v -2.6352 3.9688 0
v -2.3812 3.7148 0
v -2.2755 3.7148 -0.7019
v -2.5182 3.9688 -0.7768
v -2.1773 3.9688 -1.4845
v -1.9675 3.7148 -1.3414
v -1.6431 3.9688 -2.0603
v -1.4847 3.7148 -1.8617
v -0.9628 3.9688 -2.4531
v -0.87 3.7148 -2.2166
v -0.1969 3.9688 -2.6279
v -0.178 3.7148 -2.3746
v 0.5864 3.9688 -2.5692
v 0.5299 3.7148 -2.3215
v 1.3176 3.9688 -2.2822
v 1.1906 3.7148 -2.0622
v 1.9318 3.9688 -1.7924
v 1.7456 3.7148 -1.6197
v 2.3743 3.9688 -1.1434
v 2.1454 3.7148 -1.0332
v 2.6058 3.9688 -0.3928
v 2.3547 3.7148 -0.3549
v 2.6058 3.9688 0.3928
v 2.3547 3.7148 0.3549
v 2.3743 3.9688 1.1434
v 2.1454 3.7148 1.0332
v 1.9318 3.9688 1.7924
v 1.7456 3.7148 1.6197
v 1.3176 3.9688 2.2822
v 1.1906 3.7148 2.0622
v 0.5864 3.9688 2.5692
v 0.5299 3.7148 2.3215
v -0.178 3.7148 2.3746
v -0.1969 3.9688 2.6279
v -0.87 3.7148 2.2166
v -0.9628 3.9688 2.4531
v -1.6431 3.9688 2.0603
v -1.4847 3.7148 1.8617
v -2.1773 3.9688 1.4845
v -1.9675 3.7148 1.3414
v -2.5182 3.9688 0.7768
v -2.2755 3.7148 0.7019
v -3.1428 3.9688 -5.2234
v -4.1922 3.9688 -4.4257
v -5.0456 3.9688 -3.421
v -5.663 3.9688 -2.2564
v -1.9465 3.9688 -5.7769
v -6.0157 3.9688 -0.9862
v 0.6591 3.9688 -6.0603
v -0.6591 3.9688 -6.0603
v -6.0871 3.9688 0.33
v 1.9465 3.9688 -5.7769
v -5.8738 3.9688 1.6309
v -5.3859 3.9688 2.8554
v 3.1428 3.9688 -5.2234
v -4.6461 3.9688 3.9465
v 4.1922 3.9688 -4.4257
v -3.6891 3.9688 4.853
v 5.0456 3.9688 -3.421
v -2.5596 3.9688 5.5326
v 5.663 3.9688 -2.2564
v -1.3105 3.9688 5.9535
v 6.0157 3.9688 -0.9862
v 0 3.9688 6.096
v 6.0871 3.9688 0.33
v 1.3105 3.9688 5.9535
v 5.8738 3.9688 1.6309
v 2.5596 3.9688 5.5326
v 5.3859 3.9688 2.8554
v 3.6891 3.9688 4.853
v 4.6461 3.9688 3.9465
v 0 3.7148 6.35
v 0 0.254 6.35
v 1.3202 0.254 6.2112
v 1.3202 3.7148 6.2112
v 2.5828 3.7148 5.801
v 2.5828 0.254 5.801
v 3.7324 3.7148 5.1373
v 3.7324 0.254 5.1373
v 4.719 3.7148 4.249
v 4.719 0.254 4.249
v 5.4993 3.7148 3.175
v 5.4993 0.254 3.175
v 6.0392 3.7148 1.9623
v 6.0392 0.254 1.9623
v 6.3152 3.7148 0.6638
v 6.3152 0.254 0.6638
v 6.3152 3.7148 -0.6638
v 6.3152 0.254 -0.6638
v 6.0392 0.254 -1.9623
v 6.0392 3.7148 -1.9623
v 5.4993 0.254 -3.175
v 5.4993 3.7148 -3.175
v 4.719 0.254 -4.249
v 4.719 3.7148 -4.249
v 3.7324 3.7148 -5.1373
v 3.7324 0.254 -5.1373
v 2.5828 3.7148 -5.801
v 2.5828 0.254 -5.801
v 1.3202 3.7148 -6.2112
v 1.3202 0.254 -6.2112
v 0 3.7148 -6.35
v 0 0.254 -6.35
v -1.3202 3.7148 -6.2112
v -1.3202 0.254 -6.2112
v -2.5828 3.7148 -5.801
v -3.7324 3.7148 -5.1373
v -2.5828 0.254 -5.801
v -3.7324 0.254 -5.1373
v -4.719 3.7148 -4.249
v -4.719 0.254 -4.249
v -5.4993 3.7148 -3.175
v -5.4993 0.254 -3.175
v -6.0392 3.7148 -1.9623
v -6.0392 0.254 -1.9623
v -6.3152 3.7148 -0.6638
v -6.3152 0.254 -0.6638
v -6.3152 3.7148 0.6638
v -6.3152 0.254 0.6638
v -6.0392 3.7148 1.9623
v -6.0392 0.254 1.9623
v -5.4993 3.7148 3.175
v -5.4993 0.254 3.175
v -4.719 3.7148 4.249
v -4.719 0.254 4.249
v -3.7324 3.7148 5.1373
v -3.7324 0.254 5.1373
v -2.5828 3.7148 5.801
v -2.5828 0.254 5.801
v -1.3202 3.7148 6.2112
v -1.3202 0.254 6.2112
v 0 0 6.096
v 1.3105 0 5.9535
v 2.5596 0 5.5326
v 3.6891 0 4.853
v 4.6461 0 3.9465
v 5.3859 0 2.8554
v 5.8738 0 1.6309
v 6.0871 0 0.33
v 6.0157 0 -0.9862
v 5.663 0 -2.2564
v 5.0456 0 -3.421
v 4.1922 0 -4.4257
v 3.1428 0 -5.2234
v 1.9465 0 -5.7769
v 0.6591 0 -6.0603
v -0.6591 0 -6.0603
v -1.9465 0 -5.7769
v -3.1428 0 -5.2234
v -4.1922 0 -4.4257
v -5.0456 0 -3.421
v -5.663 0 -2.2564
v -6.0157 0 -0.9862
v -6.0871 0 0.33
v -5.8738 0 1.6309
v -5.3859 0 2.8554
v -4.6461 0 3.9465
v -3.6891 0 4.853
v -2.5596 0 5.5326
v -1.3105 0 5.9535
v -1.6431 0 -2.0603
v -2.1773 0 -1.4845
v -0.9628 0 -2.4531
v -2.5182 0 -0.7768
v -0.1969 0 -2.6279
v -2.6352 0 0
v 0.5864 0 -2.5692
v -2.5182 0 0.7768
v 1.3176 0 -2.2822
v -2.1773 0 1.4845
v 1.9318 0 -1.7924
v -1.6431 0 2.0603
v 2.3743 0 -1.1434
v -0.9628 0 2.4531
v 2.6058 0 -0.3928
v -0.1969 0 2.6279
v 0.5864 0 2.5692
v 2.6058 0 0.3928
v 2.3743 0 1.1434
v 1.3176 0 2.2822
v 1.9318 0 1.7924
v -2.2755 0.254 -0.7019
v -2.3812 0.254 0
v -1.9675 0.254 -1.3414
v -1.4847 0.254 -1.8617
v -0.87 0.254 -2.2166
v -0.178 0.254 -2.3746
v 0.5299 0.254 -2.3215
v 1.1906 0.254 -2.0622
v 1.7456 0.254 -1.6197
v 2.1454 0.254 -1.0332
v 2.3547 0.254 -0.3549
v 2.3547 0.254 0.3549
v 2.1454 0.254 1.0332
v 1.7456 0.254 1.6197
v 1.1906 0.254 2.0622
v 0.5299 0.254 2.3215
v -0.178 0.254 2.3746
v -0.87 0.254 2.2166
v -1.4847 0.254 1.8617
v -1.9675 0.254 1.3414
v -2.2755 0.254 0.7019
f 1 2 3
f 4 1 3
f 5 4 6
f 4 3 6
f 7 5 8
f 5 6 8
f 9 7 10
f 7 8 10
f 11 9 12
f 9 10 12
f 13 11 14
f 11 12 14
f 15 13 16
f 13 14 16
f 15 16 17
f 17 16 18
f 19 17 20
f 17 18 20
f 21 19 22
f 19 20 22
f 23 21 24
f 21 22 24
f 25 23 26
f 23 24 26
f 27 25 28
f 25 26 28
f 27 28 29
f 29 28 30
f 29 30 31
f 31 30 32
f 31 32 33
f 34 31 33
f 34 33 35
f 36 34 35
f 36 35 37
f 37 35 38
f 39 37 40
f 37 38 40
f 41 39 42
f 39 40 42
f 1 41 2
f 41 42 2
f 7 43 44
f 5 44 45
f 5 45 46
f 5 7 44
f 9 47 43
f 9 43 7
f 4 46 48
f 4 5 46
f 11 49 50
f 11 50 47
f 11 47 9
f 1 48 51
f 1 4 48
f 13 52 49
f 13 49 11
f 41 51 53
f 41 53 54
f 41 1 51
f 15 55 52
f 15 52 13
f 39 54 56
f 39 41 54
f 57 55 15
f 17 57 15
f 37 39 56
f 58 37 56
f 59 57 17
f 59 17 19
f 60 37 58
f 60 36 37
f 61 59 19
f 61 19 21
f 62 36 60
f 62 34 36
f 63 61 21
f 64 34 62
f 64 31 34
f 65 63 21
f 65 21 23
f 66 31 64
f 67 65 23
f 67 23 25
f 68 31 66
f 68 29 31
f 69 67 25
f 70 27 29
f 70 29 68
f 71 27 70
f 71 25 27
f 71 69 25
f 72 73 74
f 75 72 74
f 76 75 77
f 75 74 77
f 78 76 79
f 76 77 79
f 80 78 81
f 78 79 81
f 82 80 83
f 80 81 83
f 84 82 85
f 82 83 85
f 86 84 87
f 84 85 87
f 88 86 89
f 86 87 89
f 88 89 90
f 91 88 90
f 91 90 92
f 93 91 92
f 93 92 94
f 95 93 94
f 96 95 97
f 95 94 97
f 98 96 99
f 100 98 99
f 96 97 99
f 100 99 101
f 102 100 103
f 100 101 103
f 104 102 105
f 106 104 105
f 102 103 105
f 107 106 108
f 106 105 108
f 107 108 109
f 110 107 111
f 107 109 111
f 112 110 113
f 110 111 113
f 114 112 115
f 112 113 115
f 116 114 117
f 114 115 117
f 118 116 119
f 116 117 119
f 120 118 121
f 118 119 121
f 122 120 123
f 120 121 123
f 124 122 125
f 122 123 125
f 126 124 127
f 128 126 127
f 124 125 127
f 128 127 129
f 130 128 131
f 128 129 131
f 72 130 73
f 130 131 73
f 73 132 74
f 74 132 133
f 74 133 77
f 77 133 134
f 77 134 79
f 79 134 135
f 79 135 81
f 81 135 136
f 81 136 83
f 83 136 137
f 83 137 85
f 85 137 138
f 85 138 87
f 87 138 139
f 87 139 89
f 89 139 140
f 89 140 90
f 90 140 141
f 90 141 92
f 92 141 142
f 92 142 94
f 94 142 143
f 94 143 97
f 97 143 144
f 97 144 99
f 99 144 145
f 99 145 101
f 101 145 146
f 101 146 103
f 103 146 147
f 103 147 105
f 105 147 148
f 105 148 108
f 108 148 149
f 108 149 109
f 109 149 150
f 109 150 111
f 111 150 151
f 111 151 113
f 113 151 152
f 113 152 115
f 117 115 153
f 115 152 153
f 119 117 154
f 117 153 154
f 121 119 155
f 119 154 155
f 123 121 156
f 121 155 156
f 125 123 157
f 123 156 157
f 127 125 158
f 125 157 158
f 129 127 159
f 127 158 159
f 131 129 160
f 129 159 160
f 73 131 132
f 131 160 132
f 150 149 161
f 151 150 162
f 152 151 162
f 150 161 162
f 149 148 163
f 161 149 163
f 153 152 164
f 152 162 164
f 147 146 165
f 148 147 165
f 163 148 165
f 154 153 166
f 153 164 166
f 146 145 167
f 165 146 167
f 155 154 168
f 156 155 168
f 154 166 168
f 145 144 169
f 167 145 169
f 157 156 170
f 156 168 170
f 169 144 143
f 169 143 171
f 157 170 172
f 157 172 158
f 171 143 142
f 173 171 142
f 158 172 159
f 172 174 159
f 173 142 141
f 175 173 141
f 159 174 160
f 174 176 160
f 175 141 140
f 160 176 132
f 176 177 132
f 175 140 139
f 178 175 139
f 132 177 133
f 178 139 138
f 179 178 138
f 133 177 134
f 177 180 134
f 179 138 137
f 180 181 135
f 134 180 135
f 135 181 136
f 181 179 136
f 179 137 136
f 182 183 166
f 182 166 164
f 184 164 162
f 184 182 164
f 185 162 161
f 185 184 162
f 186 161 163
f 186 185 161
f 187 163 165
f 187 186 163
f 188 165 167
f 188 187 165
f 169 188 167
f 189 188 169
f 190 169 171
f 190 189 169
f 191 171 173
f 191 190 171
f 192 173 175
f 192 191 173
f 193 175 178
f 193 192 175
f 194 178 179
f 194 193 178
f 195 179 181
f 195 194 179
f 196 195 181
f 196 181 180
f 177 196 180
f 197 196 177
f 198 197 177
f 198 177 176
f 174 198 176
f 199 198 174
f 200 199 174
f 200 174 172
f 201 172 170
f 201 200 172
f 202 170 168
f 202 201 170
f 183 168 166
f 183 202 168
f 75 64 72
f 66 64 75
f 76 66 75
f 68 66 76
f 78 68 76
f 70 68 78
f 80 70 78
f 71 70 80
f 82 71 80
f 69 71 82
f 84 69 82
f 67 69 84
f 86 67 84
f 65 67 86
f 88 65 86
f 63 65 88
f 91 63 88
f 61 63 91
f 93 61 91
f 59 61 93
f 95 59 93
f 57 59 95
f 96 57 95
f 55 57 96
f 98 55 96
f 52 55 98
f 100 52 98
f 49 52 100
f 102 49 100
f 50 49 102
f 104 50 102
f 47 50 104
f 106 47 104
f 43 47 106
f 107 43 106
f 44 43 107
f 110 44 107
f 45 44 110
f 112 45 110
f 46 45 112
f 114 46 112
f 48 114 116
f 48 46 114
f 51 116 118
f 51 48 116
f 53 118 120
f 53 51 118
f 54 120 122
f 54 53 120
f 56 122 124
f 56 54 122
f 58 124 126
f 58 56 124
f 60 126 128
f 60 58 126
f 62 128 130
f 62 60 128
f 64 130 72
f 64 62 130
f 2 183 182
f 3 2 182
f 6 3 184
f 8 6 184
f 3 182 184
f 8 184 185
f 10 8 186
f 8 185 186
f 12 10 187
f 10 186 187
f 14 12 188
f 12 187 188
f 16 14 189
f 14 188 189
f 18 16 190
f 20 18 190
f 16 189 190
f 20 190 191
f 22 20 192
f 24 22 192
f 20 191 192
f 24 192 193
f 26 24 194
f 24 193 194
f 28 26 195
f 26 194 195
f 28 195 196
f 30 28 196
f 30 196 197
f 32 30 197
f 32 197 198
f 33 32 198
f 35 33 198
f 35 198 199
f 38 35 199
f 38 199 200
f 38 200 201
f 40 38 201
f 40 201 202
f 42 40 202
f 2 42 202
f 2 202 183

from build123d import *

# Parameters (mm, degrees)
SKETCH1_R                      = 6.35
BOSS_EXTRUDE1_DEPTH            = 3.96875
F_3_16_0_1875_DIAMETER_HOLE1_D = 4.7625
CHAMFER1_SIZE                  = 0.254


with BuildPart() as part:
    # Sketch1 → Boss-Extrude1 (new body)
    with BuildSketch(Plane(origin=(0, 0, 0), x_dir=(1, 0, 0), z_dir=(0, 1, 0))):
        with Locations(Location((0, 0, 0), (0, 0, 270))):
            Circle(SKETCH1_R)
    extrude(amount=BOSS_EXTRUDE1_DEPTH)

    # 3/16 (0.1875) Diameter Hole1 (through all)
    with Locations(Plane(origin=(0, 3.96875, 0), x_dir=(1, 0, 0), z_dir=(0, 1, 0))):
        with Locations((0, 0)):
            Hole(F_3_16_0_1875_DIAMETER_HOLE1_D / 2)

    # Chamfer1
    chamfer1_edges = [part.edges().sort_by_distance(p)[0] for p in [
        (0, 0, -6.35),
        (0, 3.96875, -6.35),
        (2.38125, 3.96875, 0),
        (2.38125, 0, 0),
    ]]
    chamfer(chamfer1_edges, length=CHAMFER1_SIZE)


solid = part.part
